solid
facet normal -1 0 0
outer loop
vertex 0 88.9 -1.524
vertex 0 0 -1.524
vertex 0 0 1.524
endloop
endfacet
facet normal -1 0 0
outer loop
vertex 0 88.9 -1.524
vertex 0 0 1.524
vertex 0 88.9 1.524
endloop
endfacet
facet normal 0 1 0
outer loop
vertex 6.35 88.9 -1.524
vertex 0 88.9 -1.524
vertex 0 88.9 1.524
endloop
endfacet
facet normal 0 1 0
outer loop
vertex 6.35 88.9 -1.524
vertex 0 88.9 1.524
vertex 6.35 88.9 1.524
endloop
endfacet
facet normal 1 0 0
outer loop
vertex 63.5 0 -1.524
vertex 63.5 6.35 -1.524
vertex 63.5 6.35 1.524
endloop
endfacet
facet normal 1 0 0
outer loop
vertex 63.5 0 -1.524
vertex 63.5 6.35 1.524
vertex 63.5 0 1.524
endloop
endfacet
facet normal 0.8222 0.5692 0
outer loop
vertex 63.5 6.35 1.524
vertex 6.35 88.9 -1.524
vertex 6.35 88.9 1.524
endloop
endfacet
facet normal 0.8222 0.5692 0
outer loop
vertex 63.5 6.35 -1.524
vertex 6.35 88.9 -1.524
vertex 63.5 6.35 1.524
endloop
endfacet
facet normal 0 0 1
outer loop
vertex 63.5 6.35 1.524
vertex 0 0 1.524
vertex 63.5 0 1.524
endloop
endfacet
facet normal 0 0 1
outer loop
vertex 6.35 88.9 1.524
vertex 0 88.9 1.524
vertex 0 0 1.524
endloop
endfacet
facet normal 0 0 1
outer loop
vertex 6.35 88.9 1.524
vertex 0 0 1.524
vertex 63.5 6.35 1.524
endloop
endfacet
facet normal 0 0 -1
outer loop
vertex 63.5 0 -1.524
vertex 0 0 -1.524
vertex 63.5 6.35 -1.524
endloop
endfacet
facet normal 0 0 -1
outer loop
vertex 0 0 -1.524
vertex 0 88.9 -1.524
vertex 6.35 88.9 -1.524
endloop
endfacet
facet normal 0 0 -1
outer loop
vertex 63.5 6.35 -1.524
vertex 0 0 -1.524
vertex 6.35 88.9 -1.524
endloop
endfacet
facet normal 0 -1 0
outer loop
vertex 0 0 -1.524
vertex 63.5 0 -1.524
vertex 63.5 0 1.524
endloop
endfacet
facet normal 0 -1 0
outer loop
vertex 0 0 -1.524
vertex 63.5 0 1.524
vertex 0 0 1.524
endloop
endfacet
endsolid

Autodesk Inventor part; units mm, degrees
ref_plane "YZ Plane" through (0, 0, 0) normal (1, 0, 0) x (0, 1, 0)
ref_plane "XZ Plane" through (0, 0, 0) normal (0, 1, 0) x (-1, 0, 0)
ref_plane "XY Plane" through (0, 0, 0) normal (0, 0, 1) x (1, 0, 0)
sketch "Sketch1" plane through (0, 0, 0) normal (0, 0, 1) x (1, 0, 0)
  line L0 (0, 0) -> (0, 88.9)
  line L1 (0, 88.9) -> (6.35, 88.9)
  line L2 (6.35, 88.9) -> (63.5, 6.35)
  line L3 (63.5, 6.35) -> (63.5, 0)
  line L4 (63.5, 0) -> (0, 0)
  dimension "d0" = 88.9
  dimension "d1" = 63.5
  dimension "d2" = 6.35
extrude "Extrusion1" add sketch "Sketch1" along normal mid plane 3.048
properties part number "A1-18002-100-52 Tube stop" material "Steel, Mild"
